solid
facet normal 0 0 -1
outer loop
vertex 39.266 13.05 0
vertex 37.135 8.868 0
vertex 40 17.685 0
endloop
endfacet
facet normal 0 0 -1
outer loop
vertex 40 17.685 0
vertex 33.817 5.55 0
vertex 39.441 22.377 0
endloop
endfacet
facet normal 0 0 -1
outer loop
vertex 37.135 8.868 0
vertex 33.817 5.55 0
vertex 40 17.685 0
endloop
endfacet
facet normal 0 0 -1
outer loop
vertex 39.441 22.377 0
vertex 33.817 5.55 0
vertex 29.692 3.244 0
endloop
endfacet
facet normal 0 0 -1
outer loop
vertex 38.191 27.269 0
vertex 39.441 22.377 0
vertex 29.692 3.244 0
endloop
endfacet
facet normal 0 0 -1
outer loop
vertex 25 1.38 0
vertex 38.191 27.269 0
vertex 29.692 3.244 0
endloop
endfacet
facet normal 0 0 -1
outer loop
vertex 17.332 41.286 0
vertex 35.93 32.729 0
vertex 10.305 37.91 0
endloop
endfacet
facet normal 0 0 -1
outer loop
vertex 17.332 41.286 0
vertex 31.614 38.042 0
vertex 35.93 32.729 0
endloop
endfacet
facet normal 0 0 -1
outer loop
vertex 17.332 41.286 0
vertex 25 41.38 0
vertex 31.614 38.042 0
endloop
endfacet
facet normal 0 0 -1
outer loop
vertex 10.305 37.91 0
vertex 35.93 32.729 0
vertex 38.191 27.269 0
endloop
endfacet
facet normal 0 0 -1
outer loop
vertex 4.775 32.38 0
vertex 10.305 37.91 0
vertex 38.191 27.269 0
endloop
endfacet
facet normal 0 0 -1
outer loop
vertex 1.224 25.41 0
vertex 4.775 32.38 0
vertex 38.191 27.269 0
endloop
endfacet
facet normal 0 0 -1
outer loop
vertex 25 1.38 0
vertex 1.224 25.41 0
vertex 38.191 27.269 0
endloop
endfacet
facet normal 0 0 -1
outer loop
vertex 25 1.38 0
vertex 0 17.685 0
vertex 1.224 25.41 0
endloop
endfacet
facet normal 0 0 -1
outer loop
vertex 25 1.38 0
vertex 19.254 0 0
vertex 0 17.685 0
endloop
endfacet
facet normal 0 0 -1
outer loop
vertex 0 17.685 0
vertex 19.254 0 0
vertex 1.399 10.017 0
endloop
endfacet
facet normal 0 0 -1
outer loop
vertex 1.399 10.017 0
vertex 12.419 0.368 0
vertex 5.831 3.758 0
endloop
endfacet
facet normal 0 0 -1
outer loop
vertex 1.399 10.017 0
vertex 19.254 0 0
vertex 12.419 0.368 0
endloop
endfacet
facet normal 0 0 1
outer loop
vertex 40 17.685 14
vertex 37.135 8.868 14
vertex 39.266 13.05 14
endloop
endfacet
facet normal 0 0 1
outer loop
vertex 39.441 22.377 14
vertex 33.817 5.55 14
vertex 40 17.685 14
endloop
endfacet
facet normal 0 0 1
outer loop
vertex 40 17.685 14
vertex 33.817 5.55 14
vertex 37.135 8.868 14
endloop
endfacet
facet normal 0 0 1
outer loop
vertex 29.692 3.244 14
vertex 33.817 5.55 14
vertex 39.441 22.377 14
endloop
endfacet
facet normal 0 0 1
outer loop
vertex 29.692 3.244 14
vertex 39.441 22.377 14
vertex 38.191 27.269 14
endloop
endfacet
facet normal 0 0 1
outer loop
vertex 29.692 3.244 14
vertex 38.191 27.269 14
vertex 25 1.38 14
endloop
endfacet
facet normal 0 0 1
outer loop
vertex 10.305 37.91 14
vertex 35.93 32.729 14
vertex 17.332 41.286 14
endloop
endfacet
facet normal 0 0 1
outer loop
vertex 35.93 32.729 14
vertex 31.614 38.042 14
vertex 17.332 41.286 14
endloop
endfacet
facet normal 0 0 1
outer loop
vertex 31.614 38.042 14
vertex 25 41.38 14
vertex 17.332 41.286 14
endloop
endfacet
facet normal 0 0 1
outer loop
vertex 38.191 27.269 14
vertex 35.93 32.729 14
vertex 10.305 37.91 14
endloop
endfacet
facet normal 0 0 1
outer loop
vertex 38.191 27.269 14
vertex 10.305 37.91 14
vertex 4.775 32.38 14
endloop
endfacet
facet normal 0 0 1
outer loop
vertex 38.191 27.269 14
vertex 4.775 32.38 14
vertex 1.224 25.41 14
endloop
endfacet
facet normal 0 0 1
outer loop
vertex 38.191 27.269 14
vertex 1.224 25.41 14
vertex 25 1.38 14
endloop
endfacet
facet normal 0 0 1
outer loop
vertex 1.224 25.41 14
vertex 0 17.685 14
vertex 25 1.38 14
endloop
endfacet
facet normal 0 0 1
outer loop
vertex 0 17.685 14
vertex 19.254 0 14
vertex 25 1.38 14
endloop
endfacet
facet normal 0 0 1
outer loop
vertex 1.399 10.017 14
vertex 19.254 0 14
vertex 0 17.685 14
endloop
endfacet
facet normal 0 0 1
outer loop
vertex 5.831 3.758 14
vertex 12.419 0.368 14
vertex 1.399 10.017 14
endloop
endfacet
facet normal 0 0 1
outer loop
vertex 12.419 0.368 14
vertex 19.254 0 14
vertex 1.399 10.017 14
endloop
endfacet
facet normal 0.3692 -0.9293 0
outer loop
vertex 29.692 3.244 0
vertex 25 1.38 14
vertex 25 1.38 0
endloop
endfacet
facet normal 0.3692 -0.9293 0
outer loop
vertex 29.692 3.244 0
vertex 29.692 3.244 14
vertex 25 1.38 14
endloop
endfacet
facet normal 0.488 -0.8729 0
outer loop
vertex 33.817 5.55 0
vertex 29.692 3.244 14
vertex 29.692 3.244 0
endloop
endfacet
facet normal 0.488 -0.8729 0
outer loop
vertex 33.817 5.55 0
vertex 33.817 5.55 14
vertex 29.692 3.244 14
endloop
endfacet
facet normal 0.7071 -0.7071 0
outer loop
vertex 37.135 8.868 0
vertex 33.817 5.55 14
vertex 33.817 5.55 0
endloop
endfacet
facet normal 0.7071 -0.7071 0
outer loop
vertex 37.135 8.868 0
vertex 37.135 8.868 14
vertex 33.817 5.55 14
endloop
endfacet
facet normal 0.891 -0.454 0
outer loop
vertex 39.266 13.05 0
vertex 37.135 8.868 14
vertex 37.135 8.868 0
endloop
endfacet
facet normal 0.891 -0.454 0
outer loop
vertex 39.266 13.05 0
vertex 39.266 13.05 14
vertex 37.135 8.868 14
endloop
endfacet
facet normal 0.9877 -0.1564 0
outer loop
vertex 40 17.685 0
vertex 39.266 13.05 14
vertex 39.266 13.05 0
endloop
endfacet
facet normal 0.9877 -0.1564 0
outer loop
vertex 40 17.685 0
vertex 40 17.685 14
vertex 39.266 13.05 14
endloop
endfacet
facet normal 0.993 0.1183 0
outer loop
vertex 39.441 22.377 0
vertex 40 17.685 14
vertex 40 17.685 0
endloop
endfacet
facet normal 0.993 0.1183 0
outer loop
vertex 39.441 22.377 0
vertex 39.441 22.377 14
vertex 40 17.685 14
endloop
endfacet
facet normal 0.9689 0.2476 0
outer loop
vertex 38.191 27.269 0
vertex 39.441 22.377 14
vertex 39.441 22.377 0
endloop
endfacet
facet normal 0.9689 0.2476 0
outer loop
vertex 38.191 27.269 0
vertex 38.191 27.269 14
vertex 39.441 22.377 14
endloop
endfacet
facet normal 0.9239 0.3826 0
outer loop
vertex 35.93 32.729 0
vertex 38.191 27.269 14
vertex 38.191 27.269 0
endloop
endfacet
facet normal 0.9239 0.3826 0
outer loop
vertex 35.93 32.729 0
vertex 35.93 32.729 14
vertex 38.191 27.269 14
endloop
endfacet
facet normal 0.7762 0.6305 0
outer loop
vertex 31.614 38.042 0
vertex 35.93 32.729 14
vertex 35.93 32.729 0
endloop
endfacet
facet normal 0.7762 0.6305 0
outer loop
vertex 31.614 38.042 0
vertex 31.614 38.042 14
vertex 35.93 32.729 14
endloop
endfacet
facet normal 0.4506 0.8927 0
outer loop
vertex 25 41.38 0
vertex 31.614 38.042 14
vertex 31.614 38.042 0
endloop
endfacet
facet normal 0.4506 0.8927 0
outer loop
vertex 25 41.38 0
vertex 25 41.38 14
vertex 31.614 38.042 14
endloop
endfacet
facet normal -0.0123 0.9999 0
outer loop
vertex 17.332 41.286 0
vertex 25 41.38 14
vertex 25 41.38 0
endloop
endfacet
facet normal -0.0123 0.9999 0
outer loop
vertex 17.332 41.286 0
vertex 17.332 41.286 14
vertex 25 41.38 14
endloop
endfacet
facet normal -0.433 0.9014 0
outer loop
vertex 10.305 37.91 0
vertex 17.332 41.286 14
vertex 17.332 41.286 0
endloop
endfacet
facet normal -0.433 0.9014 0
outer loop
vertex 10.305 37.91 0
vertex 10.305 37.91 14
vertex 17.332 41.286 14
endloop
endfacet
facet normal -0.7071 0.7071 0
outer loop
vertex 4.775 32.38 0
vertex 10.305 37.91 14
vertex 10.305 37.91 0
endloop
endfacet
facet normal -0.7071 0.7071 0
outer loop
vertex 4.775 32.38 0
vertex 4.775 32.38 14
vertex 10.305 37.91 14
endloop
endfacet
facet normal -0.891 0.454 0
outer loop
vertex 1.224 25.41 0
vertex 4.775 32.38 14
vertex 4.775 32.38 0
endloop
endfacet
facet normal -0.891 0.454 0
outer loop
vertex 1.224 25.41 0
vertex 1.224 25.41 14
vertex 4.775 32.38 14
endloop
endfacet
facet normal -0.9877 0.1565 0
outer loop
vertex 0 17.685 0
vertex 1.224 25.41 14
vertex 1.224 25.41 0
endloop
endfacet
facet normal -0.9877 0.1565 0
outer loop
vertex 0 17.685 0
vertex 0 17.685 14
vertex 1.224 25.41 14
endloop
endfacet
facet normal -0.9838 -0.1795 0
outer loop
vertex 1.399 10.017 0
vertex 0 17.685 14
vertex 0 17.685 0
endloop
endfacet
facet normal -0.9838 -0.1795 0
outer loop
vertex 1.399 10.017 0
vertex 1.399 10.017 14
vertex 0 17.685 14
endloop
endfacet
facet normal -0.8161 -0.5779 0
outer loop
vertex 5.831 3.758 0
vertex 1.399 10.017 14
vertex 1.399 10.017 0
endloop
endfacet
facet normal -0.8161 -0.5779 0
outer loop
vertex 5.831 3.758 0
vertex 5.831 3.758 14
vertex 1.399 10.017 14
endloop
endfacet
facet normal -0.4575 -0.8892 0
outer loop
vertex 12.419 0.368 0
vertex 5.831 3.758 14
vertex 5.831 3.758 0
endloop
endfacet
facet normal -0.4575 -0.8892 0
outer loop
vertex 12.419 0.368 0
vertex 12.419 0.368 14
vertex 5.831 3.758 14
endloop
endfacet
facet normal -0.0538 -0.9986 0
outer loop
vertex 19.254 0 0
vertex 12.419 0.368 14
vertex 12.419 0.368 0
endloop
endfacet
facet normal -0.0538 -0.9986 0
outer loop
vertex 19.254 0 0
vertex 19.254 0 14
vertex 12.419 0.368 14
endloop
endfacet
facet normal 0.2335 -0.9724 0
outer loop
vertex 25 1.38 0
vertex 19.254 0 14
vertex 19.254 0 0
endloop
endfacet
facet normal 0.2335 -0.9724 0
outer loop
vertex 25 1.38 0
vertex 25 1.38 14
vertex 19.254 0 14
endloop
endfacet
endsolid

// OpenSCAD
$fn = 32;

// ----------------------------------------------------------------------
// Cam disc: base radius 15.0 mm, lift 10.0 mm, 20 profile points
// ----------------------------------------------------------------------

// --- parameters (mm) ---
profile_height = 14;      // extrusion height
profile_points = 20;      // points of the closed outline

profile = [[40, 17.685], [39.441, 22.377], [38.191, 27.269], [35.93, 32.729], [31.614, 38.042], [25, 41.38], [17.332, 41.286], [10.305, 37.91], [4.775, 32.38], [1.224, 25.41], [0, 17.685], [1.399, 10.017], [5.831, 3.758], [12.419, 0.368], [19.254, 0], [25, 1.38], [29.692, 3.244], [33.817, 5.55], [37.135, 8.868], [39.266, 13.05]];  // single closed polygon, 20 points, counter clockwise

// --- the one profile operation ---
linear_extrude(height = profile_height) polygon(points = profile);
